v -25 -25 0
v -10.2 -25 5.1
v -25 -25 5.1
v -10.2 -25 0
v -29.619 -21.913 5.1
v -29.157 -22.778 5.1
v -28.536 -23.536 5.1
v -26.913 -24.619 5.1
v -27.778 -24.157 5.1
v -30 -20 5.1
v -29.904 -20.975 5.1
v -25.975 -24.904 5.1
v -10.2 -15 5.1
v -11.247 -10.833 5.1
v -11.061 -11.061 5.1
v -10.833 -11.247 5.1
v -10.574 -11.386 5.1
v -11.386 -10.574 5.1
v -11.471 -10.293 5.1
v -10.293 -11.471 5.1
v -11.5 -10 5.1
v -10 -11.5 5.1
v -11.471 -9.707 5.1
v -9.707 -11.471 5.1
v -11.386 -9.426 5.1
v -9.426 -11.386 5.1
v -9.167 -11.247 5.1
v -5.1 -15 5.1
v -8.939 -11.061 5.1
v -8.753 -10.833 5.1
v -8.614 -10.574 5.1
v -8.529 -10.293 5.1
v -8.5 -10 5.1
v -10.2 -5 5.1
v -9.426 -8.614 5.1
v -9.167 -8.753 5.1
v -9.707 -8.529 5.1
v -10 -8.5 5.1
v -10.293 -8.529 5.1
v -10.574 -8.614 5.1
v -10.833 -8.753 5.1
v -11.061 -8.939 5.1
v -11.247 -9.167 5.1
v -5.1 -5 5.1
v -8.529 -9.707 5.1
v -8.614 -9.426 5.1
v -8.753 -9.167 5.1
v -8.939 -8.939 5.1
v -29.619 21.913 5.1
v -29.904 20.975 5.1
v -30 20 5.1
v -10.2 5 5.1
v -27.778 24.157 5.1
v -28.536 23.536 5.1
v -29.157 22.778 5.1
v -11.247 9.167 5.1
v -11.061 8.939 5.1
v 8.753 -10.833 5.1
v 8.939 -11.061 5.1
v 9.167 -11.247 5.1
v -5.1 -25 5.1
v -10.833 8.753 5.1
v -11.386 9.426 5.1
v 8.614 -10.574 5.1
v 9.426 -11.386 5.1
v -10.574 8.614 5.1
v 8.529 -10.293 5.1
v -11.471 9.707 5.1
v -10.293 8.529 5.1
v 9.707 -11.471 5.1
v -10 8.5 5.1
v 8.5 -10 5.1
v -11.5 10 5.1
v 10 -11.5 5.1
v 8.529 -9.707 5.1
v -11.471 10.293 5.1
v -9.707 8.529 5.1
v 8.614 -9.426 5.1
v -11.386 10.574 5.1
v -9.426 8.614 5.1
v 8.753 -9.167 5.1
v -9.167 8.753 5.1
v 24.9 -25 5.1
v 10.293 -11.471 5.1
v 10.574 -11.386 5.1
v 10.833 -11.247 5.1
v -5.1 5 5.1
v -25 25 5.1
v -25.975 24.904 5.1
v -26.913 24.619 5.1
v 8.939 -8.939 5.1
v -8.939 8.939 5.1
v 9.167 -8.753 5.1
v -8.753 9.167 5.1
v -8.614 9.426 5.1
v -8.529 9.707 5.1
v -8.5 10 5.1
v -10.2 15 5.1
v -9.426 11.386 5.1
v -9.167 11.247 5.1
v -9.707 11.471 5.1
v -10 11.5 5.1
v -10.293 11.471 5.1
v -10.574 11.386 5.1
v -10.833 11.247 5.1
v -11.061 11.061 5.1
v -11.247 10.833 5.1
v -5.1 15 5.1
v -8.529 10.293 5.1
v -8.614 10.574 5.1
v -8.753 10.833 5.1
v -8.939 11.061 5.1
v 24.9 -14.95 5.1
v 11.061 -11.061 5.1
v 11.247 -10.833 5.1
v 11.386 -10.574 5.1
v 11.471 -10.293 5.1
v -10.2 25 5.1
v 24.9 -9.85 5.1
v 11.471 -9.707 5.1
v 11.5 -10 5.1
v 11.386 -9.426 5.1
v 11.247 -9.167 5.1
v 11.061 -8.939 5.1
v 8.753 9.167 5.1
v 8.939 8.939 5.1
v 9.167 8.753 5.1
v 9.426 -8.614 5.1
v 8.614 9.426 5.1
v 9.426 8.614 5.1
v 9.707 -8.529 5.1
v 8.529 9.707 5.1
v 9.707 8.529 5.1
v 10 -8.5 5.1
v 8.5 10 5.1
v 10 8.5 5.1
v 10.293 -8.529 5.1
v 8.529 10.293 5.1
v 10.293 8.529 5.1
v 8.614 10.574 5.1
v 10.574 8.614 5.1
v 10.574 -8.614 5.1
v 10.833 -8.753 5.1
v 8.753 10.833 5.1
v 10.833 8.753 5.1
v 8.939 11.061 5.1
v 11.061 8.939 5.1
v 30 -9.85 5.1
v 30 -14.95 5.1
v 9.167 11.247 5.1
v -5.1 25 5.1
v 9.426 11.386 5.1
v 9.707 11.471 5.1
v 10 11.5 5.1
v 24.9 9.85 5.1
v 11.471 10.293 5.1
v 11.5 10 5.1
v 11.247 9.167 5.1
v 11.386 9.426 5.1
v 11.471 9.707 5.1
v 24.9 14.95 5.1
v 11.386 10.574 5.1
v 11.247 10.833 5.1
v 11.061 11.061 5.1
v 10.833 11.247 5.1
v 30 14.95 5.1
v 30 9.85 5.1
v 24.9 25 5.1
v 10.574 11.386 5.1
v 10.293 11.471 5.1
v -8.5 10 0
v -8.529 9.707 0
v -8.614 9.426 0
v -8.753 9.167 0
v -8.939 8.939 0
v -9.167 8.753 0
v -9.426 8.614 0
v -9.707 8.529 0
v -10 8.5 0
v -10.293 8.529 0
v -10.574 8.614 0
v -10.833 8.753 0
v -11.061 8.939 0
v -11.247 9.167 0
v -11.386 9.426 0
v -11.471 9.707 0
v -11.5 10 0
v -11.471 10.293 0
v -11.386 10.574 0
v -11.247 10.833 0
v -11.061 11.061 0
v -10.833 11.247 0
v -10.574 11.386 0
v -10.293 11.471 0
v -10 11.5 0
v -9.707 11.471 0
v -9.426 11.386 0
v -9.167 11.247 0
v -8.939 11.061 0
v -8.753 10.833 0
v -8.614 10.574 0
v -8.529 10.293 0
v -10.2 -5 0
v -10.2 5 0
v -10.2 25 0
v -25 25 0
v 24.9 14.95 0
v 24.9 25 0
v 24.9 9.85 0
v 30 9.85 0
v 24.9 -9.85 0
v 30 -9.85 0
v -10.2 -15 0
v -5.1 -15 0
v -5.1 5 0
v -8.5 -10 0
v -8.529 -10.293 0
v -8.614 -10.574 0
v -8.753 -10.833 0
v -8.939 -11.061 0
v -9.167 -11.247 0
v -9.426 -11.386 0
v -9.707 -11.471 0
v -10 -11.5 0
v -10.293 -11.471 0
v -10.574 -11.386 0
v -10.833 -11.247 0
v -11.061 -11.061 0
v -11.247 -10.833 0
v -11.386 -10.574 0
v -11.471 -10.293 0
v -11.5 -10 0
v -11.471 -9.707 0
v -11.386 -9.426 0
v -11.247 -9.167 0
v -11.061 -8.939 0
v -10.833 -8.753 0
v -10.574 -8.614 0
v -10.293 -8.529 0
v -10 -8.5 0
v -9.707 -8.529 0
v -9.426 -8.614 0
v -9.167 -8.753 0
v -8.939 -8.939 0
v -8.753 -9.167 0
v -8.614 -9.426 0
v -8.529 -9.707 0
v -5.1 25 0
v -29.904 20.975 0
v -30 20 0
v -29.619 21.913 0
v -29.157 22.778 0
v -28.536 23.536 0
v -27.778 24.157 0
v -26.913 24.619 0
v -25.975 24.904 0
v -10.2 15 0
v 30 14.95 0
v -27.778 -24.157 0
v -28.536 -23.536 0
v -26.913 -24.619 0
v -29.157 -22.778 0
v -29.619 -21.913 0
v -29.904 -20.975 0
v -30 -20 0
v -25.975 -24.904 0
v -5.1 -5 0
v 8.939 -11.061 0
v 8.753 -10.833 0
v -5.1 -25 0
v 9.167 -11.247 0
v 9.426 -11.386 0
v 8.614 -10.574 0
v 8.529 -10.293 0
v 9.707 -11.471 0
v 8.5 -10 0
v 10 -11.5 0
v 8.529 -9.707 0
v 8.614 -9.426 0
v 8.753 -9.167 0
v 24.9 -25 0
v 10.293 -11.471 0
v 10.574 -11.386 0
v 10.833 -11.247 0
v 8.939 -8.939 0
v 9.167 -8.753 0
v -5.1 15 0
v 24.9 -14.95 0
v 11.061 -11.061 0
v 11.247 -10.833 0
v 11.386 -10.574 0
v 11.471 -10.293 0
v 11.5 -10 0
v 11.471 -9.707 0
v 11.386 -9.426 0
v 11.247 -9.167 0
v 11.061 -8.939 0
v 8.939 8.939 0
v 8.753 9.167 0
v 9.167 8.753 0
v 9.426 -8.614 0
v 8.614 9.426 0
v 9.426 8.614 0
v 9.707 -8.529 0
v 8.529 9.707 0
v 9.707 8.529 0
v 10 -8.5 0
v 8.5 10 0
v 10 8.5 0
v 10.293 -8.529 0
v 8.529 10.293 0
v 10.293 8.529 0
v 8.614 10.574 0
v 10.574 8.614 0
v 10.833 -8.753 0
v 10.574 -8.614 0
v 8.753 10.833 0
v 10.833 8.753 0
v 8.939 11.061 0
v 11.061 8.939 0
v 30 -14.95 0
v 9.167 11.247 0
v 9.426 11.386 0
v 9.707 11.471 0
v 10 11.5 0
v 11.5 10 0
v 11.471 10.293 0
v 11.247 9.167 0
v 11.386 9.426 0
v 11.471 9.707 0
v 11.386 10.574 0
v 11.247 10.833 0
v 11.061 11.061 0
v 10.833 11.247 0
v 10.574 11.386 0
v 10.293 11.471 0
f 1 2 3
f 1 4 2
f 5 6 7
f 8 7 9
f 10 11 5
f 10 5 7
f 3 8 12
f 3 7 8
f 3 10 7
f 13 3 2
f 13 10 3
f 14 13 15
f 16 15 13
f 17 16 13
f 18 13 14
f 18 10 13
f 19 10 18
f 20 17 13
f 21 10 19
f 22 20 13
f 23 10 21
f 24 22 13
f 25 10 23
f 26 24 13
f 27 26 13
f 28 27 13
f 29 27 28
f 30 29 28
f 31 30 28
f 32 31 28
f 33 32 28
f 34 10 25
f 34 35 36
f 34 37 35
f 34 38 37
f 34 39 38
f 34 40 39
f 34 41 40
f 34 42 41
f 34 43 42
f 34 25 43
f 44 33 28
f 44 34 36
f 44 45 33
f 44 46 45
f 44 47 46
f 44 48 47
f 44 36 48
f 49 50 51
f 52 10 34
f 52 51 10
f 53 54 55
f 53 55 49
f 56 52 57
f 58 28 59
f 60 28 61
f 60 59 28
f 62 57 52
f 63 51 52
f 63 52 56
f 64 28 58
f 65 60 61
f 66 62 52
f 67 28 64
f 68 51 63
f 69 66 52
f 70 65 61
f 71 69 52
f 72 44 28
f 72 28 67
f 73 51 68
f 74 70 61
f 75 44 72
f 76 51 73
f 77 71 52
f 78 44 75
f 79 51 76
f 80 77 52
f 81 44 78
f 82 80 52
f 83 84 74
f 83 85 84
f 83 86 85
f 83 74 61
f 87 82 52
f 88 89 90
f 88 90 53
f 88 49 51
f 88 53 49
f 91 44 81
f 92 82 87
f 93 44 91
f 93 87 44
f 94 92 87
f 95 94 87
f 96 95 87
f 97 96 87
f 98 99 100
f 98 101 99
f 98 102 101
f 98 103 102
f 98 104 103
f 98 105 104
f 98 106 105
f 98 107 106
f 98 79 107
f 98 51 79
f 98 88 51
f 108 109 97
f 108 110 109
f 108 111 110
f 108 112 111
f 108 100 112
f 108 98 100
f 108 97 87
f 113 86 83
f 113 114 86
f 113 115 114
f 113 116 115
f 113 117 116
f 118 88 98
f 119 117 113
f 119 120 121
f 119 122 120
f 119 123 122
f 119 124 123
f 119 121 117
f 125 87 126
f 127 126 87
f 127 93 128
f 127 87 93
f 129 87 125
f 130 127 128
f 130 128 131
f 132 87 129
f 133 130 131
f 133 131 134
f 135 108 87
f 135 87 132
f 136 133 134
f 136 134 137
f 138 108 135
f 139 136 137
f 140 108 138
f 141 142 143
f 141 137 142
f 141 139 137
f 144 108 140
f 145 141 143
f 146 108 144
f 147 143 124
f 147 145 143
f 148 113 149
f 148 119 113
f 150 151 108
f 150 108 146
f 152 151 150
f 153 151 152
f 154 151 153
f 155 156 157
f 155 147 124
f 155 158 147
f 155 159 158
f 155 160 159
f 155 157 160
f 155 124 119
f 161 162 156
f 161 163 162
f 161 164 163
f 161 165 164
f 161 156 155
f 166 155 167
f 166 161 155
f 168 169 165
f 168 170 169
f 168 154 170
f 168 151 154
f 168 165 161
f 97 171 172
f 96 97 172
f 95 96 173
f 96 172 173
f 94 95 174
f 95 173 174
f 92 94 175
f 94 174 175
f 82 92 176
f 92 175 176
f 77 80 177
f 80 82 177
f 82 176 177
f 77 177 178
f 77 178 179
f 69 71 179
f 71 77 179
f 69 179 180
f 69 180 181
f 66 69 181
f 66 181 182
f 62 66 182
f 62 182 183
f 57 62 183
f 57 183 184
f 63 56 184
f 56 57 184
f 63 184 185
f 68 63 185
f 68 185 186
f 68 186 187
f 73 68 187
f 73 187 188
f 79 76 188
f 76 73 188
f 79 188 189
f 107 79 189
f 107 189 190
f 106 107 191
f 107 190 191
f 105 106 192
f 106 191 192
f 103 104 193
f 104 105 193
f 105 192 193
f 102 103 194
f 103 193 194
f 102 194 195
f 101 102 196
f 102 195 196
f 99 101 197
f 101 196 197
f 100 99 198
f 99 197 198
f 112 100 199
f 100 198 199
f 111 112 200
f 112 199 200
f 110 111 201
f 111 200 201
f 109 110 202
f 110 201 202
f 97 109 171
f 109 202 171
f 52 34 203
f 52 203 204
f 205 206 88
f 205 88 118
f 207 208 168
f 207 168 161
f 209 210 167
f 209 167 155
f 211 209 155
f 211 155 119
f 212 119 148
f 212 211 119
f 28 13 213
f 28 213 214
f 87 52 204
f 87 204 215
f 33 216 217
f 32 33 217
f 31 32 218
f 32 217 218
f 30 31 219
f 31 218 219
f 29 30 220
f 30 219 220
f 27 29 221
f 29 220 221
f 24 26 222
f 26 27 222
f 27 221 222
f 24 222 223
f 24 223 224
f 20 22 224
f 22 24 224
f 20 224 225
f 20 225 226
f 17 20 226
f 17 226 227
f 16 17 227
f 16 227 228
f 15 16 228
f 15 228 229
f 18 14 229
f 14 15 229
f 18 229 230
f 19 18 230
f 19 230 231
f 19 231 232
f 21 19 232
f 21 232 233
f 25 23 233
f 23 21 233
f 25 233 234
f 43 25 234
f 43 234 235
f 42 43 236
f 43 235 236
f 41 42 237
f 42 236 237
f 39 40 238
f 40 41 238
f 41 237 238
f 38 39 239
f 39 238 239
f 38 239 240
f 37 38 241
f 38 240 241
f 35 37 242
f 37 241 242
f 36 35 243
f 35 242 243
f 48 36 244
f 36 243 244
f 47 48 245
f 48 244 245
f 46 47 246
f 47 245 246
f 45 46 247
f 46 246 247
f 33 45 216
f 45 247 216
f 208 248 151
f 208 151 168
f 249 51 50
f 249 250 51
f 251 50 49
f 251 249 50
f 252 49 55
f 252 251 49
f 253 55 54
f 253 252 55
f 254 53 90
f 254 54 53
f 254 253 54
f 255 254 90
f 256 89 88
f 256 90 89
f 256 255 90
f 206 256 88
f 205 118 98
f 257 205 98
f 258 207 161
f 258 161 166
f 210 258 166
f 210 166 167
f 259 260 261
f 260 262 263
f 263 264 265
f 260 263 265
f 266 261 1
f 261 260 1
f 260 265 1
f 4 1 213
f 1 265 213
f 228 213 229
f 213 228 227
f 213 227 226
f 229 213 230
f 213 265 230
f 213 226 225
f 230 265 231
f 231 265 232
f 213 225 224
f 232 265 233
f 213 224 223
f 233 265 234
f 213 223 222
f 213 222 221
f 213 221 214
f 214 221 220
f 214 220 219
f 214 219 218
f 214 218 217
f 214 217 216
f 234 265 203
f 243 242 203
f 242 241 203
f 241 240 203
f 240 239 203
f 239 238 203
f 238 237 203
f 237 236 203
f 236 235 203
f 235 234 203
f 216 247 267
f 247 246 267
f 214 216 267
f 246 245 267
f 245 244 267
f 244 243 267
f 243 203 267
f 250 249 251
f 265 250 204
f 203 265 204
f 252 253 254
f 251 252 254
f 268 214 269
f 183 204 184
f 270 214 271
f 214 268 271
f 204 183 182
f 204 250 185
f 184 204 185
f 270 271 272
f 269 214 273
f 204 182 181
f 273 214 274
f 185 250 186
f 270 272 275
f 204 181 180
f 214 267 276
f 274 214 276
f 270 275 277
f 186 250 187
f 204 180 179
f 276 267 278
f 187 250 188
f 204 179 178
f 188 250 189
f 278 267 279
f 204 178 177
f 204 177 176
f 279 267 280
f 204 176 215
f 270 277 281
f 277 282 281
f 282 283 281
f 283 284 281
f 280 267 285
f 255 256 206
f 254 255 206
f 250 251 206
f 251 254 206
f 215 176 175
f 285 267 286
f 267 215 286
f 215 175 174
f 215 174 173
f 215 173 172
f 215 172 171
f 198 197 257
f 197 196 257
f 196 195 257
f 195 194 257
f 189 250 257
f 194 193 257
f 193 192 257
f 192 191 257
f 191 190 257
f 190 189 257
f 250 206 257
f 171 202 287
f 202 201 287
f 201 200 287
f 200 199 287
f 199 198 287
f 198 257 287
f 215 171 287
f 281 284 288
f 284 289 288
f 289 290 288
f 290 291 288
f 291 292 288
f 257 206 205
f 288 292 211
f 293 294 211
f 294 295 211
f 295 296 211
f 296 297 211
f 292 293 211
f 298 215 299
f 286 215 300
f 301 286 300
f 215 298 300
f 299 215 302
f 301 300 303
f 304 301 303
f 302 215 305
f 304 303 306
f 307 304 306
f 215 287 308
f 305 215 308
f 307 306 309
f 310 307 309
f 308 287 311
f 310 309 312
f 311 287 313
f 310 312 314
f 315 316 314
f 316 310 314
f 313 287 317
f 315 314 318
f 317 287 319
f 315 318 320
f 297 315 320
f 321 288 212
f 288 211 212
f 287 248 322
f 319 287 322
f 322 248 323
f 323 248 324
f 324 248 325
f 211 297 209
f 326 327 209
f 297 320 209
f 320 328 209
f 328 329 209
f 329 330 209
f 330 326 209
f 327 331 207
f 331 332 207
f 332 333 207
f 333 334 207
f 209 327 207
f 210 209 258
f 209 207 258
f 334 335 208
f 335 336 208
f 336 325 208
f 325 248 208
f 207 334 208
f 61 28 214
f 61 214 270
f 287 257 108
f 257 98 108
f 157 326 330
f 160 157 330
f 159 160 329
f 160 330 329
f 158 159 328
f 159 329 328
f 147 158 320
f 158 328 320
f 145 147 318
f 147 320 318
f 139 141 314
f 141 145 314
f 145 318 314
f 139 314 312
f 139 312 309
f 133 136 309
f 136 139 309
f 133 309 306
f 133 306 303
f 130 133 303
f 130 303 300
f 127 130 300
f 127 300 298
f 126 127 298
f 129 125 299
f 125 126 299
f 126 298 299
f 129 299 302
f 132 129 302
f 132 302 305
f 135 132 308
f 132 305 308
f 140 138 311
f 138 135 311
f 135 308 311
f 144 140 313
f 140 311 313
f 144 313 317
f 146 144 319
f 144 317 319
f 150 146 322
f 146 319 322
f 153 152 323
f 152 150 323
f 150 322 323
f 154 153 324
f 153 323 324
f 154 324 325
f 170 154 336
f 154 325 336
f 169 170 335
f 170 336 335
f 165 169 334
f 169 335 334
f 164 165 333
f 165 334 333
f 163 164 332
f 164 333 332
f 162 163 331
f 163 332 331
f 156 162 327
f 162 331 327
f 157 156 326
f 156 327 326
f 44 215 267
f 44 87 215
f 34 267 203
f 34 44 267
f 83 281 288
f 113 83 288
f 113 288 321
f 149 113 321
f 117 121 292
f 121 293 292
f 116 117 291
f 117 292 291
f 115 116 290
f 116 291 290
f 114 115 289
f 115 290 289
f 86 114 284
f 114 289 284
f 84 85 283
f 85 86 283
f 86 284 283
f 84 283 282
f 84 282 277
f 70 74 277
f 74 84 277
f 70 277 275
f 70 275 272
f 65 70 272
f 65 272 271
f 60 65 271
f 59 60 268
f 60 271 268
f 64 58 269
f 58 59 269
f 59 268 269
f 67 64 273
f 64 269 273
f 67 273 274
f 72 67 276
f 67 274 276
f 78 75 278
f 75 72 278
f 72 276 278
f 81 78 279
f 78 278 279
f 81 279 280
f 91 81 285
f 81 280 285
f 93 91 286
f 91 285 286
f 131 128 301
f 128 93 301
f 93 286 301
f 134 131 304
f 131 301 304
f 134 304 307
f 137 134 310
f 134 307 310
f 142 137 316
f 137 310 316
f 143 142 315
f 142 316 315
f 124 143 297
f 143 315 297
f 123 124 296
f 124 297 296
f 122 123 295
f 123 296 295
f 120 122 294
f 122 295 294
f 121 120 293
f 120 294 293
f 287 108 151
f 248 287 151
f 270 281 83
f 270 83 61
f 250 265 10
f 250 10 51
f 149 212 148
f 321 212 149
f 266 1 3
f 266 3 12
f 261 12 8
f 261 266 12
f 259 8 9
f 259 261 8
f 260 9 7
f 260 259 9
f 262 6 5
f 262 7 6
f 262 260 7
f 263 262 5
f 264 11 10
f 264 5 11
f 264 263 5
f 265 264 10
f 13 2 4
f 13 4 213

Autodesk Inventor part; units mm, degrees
ref_plane "YZ Plane" through (0, 0, 0) normal (1, 0, 0) x (0, 1, 0)
ref_plane "XZ Plane" through (0, 0, 0) normal (0, 1, 0) x (-1, 0, 0)
ref_plane "XY Plane" through (0, 0, 0) normal (0, 0, 1) x (1, 0, 0)
sketch "Sketch1" plane through (0, 0, 0) normal (0, 0, 1) x (1, 0, 0)
  line L0 (30, -25) -> (-25, -25)
  line L1 (-30, -20) -> (-30, 20)
  line L2 (-25, 25) -> (30, 25)
  line L3 (30, 25) -> (30, -25)
  line L4 (30, -25) -> (-30, 25) construction
  line L5 (-30, -25) -> (30, 25) construction
  circle A0 centre (-10, 10) radius 1.5
  circle A1 centre (-10, -10) radius 1.5
  circle A2 centre (10, 10) radius 1.5
  circle A3 centre (10, -10) radius 1.5
  arc A4 (-25, 25) -> (-30, 20) centre (-25, 20) ccw
  arc A5 (-30, -20) -> (-25, -25) centre (-25, -20) ccw
  point P0 (0, 0)
  dimension "d0" = 60
  dimension "d1" = 50
  dimension "d2" = 3
  dimension "d3" = 3
  dimension "d4" = 3
  dimension "d5" = 3
  dimension "d6" = 10
  dimension "d7" = 10
  dimension "d8" = 10
  dimension "d9" = 10
  dimension "d10" = 10
  dimension "d11" = 10
  dimension "d12" = 10
  dimension "d13" = 10
  dimension "d14" = 5
extrude "Extrusion1" add sketch "Sketch1" along normal blind 5.1
sketch "Sketch4" plane through (0, 0, 0) normal (0, 0, -1) x (-1, 0, 0)
  line L0 (-30, 25) -> (25, 25) projected
  line L1 (-30, 25) -> (-24.9, 25)
  line L2 (-24.9, 25) -> (-24.9, 14.95)
  line L3 (-24.9, 14.95) -> (-30, 14.95)
  line L4 (-30, 14.95) -> (-30, 25)
  line L5 (-30, -25) -> (-30, 25) projected
  line L6 (-30, 9.85) -> (-24.9, 9.85)
  line L7 (-24.9, 9.85) -> (-24.9, -9.85)
  line L8 (-24.9, -9.85) -> (-30, -9.85)
  line L9 (-30, -9.85) -> (-30, 9.85)
  line L10 (25, -25) -> (-30, -25) projected
  line L11 (-30, -25) -> (-24.9, -25)
  line L12 (-24.9, -25) -> (-24.9, -14.95)
  line L13 (-24.9, -14.95) -> (-30, -14.95)
  line L14 (-30, -14.95) -> (-30, -25)
  point P0 (0, 0)
  point P1 (-24.9, 0)
  point P2 (-30, 0)
  dimension "d27" = 5.1
  dimension "d28" = 10.05
  dimension "d29" = 5.1
  dimension "d30" = 19.7
  dimension "d31" = 10.05
  dimension "d32" = 5.1
extrude "Extrusion5" cut sketch "Sketch4" against normal blind 40
sketch "Sketch5" plane through (0, 0, 5.1) normal (0, 0, 1) x (1, 0, 0)
  circle A0 centre (10, -10) radius 1.5 projected
  circle A1 centre (10, 10) radius 1.5 projected
  line L0 (24.9, -25) -> (24.9, -14.95) projected
  line L1 (24.9, -14.95) -> (30, -14.95) projected
  line L2 (30, -14.95) -> (30, -9.85) projected
  line L3 (30, -9.85) -> (24.9, -9.85) projected
  line L4 (24.9, -9.85) -> (24.9, 9.85) projected
  line L5 (24.9, 9.85) -> (30, 9.85) projected
  line L6 (30, 9.85) -> (30, 14.95) projected
  line L7 (30, 14.95) -> (24.9, 14.95) projected
  line L8 (24.9, 14.95) -> (24.9, 25) projected
  line L9 (24.9, 25) -> (-25, 25) projected
  arc A2 (-25, 25) -> (-30, 20) centre (-25, 20) ccw projected
  line L10 (-30, 20) -> (-30, -20) projected
  arc A3 (-30, -20) -> (-25, -25) centre (-25, -20) ccw projected
  line L11 (-25, -25) -> (24.9, -25) projected
  line L12 (-10.2, 5) -> (-5.1, 5)
  line L13 (-5.1, 5) -> (-5.1, -5)
  line L14 (-5.1, -5) -> (-10.2, -5)
  line L15 (-10.2, -5) -> (-10.2, 5)
  line L16 (-10.2, -15) -> (-5.1, -15)
  line L17 (-5.1, -15) -> (-5.1, -25)
  line L18 (-5.1, -25) -> (-10.2, -25)
  line L19 (-10.2, -25) -> (-10.2, -15)
  line L20 (-10.2, 15) -> (-5.1, 15)
  line L21 (-5.1, 15) -> (-5.1, 25)
  line L22 (-5.1, 25) -> (-10.2, 25)
  line L23 (-10.2, 25) -> (-10.2, 15)
  line L24 (-43.2426, 0) -> (42.2071, 0) construction
  point P0 (0, 0)
  dimension "d35" = 5.1
  dimension "d36" = 5.1
  dimension "d37" = 5.1
  dimension "d38" = 19.7
  dimension "d40" = 30
  dimension "d43" = 10
  dimension "d44" = 10
extrude "Extrusion6" cut sketch "Sketch5" against normal through all contours L11 L19 L16 L17 | L9 L21 L20 L23 | L12 L13 L14 L15
equation "\"d36\" = d35"
equation "\"d37\" = d36"
equation "\"d44\" = d43"
properties part number "motor chasis holder" material "Polycarbonate, Smoke"
